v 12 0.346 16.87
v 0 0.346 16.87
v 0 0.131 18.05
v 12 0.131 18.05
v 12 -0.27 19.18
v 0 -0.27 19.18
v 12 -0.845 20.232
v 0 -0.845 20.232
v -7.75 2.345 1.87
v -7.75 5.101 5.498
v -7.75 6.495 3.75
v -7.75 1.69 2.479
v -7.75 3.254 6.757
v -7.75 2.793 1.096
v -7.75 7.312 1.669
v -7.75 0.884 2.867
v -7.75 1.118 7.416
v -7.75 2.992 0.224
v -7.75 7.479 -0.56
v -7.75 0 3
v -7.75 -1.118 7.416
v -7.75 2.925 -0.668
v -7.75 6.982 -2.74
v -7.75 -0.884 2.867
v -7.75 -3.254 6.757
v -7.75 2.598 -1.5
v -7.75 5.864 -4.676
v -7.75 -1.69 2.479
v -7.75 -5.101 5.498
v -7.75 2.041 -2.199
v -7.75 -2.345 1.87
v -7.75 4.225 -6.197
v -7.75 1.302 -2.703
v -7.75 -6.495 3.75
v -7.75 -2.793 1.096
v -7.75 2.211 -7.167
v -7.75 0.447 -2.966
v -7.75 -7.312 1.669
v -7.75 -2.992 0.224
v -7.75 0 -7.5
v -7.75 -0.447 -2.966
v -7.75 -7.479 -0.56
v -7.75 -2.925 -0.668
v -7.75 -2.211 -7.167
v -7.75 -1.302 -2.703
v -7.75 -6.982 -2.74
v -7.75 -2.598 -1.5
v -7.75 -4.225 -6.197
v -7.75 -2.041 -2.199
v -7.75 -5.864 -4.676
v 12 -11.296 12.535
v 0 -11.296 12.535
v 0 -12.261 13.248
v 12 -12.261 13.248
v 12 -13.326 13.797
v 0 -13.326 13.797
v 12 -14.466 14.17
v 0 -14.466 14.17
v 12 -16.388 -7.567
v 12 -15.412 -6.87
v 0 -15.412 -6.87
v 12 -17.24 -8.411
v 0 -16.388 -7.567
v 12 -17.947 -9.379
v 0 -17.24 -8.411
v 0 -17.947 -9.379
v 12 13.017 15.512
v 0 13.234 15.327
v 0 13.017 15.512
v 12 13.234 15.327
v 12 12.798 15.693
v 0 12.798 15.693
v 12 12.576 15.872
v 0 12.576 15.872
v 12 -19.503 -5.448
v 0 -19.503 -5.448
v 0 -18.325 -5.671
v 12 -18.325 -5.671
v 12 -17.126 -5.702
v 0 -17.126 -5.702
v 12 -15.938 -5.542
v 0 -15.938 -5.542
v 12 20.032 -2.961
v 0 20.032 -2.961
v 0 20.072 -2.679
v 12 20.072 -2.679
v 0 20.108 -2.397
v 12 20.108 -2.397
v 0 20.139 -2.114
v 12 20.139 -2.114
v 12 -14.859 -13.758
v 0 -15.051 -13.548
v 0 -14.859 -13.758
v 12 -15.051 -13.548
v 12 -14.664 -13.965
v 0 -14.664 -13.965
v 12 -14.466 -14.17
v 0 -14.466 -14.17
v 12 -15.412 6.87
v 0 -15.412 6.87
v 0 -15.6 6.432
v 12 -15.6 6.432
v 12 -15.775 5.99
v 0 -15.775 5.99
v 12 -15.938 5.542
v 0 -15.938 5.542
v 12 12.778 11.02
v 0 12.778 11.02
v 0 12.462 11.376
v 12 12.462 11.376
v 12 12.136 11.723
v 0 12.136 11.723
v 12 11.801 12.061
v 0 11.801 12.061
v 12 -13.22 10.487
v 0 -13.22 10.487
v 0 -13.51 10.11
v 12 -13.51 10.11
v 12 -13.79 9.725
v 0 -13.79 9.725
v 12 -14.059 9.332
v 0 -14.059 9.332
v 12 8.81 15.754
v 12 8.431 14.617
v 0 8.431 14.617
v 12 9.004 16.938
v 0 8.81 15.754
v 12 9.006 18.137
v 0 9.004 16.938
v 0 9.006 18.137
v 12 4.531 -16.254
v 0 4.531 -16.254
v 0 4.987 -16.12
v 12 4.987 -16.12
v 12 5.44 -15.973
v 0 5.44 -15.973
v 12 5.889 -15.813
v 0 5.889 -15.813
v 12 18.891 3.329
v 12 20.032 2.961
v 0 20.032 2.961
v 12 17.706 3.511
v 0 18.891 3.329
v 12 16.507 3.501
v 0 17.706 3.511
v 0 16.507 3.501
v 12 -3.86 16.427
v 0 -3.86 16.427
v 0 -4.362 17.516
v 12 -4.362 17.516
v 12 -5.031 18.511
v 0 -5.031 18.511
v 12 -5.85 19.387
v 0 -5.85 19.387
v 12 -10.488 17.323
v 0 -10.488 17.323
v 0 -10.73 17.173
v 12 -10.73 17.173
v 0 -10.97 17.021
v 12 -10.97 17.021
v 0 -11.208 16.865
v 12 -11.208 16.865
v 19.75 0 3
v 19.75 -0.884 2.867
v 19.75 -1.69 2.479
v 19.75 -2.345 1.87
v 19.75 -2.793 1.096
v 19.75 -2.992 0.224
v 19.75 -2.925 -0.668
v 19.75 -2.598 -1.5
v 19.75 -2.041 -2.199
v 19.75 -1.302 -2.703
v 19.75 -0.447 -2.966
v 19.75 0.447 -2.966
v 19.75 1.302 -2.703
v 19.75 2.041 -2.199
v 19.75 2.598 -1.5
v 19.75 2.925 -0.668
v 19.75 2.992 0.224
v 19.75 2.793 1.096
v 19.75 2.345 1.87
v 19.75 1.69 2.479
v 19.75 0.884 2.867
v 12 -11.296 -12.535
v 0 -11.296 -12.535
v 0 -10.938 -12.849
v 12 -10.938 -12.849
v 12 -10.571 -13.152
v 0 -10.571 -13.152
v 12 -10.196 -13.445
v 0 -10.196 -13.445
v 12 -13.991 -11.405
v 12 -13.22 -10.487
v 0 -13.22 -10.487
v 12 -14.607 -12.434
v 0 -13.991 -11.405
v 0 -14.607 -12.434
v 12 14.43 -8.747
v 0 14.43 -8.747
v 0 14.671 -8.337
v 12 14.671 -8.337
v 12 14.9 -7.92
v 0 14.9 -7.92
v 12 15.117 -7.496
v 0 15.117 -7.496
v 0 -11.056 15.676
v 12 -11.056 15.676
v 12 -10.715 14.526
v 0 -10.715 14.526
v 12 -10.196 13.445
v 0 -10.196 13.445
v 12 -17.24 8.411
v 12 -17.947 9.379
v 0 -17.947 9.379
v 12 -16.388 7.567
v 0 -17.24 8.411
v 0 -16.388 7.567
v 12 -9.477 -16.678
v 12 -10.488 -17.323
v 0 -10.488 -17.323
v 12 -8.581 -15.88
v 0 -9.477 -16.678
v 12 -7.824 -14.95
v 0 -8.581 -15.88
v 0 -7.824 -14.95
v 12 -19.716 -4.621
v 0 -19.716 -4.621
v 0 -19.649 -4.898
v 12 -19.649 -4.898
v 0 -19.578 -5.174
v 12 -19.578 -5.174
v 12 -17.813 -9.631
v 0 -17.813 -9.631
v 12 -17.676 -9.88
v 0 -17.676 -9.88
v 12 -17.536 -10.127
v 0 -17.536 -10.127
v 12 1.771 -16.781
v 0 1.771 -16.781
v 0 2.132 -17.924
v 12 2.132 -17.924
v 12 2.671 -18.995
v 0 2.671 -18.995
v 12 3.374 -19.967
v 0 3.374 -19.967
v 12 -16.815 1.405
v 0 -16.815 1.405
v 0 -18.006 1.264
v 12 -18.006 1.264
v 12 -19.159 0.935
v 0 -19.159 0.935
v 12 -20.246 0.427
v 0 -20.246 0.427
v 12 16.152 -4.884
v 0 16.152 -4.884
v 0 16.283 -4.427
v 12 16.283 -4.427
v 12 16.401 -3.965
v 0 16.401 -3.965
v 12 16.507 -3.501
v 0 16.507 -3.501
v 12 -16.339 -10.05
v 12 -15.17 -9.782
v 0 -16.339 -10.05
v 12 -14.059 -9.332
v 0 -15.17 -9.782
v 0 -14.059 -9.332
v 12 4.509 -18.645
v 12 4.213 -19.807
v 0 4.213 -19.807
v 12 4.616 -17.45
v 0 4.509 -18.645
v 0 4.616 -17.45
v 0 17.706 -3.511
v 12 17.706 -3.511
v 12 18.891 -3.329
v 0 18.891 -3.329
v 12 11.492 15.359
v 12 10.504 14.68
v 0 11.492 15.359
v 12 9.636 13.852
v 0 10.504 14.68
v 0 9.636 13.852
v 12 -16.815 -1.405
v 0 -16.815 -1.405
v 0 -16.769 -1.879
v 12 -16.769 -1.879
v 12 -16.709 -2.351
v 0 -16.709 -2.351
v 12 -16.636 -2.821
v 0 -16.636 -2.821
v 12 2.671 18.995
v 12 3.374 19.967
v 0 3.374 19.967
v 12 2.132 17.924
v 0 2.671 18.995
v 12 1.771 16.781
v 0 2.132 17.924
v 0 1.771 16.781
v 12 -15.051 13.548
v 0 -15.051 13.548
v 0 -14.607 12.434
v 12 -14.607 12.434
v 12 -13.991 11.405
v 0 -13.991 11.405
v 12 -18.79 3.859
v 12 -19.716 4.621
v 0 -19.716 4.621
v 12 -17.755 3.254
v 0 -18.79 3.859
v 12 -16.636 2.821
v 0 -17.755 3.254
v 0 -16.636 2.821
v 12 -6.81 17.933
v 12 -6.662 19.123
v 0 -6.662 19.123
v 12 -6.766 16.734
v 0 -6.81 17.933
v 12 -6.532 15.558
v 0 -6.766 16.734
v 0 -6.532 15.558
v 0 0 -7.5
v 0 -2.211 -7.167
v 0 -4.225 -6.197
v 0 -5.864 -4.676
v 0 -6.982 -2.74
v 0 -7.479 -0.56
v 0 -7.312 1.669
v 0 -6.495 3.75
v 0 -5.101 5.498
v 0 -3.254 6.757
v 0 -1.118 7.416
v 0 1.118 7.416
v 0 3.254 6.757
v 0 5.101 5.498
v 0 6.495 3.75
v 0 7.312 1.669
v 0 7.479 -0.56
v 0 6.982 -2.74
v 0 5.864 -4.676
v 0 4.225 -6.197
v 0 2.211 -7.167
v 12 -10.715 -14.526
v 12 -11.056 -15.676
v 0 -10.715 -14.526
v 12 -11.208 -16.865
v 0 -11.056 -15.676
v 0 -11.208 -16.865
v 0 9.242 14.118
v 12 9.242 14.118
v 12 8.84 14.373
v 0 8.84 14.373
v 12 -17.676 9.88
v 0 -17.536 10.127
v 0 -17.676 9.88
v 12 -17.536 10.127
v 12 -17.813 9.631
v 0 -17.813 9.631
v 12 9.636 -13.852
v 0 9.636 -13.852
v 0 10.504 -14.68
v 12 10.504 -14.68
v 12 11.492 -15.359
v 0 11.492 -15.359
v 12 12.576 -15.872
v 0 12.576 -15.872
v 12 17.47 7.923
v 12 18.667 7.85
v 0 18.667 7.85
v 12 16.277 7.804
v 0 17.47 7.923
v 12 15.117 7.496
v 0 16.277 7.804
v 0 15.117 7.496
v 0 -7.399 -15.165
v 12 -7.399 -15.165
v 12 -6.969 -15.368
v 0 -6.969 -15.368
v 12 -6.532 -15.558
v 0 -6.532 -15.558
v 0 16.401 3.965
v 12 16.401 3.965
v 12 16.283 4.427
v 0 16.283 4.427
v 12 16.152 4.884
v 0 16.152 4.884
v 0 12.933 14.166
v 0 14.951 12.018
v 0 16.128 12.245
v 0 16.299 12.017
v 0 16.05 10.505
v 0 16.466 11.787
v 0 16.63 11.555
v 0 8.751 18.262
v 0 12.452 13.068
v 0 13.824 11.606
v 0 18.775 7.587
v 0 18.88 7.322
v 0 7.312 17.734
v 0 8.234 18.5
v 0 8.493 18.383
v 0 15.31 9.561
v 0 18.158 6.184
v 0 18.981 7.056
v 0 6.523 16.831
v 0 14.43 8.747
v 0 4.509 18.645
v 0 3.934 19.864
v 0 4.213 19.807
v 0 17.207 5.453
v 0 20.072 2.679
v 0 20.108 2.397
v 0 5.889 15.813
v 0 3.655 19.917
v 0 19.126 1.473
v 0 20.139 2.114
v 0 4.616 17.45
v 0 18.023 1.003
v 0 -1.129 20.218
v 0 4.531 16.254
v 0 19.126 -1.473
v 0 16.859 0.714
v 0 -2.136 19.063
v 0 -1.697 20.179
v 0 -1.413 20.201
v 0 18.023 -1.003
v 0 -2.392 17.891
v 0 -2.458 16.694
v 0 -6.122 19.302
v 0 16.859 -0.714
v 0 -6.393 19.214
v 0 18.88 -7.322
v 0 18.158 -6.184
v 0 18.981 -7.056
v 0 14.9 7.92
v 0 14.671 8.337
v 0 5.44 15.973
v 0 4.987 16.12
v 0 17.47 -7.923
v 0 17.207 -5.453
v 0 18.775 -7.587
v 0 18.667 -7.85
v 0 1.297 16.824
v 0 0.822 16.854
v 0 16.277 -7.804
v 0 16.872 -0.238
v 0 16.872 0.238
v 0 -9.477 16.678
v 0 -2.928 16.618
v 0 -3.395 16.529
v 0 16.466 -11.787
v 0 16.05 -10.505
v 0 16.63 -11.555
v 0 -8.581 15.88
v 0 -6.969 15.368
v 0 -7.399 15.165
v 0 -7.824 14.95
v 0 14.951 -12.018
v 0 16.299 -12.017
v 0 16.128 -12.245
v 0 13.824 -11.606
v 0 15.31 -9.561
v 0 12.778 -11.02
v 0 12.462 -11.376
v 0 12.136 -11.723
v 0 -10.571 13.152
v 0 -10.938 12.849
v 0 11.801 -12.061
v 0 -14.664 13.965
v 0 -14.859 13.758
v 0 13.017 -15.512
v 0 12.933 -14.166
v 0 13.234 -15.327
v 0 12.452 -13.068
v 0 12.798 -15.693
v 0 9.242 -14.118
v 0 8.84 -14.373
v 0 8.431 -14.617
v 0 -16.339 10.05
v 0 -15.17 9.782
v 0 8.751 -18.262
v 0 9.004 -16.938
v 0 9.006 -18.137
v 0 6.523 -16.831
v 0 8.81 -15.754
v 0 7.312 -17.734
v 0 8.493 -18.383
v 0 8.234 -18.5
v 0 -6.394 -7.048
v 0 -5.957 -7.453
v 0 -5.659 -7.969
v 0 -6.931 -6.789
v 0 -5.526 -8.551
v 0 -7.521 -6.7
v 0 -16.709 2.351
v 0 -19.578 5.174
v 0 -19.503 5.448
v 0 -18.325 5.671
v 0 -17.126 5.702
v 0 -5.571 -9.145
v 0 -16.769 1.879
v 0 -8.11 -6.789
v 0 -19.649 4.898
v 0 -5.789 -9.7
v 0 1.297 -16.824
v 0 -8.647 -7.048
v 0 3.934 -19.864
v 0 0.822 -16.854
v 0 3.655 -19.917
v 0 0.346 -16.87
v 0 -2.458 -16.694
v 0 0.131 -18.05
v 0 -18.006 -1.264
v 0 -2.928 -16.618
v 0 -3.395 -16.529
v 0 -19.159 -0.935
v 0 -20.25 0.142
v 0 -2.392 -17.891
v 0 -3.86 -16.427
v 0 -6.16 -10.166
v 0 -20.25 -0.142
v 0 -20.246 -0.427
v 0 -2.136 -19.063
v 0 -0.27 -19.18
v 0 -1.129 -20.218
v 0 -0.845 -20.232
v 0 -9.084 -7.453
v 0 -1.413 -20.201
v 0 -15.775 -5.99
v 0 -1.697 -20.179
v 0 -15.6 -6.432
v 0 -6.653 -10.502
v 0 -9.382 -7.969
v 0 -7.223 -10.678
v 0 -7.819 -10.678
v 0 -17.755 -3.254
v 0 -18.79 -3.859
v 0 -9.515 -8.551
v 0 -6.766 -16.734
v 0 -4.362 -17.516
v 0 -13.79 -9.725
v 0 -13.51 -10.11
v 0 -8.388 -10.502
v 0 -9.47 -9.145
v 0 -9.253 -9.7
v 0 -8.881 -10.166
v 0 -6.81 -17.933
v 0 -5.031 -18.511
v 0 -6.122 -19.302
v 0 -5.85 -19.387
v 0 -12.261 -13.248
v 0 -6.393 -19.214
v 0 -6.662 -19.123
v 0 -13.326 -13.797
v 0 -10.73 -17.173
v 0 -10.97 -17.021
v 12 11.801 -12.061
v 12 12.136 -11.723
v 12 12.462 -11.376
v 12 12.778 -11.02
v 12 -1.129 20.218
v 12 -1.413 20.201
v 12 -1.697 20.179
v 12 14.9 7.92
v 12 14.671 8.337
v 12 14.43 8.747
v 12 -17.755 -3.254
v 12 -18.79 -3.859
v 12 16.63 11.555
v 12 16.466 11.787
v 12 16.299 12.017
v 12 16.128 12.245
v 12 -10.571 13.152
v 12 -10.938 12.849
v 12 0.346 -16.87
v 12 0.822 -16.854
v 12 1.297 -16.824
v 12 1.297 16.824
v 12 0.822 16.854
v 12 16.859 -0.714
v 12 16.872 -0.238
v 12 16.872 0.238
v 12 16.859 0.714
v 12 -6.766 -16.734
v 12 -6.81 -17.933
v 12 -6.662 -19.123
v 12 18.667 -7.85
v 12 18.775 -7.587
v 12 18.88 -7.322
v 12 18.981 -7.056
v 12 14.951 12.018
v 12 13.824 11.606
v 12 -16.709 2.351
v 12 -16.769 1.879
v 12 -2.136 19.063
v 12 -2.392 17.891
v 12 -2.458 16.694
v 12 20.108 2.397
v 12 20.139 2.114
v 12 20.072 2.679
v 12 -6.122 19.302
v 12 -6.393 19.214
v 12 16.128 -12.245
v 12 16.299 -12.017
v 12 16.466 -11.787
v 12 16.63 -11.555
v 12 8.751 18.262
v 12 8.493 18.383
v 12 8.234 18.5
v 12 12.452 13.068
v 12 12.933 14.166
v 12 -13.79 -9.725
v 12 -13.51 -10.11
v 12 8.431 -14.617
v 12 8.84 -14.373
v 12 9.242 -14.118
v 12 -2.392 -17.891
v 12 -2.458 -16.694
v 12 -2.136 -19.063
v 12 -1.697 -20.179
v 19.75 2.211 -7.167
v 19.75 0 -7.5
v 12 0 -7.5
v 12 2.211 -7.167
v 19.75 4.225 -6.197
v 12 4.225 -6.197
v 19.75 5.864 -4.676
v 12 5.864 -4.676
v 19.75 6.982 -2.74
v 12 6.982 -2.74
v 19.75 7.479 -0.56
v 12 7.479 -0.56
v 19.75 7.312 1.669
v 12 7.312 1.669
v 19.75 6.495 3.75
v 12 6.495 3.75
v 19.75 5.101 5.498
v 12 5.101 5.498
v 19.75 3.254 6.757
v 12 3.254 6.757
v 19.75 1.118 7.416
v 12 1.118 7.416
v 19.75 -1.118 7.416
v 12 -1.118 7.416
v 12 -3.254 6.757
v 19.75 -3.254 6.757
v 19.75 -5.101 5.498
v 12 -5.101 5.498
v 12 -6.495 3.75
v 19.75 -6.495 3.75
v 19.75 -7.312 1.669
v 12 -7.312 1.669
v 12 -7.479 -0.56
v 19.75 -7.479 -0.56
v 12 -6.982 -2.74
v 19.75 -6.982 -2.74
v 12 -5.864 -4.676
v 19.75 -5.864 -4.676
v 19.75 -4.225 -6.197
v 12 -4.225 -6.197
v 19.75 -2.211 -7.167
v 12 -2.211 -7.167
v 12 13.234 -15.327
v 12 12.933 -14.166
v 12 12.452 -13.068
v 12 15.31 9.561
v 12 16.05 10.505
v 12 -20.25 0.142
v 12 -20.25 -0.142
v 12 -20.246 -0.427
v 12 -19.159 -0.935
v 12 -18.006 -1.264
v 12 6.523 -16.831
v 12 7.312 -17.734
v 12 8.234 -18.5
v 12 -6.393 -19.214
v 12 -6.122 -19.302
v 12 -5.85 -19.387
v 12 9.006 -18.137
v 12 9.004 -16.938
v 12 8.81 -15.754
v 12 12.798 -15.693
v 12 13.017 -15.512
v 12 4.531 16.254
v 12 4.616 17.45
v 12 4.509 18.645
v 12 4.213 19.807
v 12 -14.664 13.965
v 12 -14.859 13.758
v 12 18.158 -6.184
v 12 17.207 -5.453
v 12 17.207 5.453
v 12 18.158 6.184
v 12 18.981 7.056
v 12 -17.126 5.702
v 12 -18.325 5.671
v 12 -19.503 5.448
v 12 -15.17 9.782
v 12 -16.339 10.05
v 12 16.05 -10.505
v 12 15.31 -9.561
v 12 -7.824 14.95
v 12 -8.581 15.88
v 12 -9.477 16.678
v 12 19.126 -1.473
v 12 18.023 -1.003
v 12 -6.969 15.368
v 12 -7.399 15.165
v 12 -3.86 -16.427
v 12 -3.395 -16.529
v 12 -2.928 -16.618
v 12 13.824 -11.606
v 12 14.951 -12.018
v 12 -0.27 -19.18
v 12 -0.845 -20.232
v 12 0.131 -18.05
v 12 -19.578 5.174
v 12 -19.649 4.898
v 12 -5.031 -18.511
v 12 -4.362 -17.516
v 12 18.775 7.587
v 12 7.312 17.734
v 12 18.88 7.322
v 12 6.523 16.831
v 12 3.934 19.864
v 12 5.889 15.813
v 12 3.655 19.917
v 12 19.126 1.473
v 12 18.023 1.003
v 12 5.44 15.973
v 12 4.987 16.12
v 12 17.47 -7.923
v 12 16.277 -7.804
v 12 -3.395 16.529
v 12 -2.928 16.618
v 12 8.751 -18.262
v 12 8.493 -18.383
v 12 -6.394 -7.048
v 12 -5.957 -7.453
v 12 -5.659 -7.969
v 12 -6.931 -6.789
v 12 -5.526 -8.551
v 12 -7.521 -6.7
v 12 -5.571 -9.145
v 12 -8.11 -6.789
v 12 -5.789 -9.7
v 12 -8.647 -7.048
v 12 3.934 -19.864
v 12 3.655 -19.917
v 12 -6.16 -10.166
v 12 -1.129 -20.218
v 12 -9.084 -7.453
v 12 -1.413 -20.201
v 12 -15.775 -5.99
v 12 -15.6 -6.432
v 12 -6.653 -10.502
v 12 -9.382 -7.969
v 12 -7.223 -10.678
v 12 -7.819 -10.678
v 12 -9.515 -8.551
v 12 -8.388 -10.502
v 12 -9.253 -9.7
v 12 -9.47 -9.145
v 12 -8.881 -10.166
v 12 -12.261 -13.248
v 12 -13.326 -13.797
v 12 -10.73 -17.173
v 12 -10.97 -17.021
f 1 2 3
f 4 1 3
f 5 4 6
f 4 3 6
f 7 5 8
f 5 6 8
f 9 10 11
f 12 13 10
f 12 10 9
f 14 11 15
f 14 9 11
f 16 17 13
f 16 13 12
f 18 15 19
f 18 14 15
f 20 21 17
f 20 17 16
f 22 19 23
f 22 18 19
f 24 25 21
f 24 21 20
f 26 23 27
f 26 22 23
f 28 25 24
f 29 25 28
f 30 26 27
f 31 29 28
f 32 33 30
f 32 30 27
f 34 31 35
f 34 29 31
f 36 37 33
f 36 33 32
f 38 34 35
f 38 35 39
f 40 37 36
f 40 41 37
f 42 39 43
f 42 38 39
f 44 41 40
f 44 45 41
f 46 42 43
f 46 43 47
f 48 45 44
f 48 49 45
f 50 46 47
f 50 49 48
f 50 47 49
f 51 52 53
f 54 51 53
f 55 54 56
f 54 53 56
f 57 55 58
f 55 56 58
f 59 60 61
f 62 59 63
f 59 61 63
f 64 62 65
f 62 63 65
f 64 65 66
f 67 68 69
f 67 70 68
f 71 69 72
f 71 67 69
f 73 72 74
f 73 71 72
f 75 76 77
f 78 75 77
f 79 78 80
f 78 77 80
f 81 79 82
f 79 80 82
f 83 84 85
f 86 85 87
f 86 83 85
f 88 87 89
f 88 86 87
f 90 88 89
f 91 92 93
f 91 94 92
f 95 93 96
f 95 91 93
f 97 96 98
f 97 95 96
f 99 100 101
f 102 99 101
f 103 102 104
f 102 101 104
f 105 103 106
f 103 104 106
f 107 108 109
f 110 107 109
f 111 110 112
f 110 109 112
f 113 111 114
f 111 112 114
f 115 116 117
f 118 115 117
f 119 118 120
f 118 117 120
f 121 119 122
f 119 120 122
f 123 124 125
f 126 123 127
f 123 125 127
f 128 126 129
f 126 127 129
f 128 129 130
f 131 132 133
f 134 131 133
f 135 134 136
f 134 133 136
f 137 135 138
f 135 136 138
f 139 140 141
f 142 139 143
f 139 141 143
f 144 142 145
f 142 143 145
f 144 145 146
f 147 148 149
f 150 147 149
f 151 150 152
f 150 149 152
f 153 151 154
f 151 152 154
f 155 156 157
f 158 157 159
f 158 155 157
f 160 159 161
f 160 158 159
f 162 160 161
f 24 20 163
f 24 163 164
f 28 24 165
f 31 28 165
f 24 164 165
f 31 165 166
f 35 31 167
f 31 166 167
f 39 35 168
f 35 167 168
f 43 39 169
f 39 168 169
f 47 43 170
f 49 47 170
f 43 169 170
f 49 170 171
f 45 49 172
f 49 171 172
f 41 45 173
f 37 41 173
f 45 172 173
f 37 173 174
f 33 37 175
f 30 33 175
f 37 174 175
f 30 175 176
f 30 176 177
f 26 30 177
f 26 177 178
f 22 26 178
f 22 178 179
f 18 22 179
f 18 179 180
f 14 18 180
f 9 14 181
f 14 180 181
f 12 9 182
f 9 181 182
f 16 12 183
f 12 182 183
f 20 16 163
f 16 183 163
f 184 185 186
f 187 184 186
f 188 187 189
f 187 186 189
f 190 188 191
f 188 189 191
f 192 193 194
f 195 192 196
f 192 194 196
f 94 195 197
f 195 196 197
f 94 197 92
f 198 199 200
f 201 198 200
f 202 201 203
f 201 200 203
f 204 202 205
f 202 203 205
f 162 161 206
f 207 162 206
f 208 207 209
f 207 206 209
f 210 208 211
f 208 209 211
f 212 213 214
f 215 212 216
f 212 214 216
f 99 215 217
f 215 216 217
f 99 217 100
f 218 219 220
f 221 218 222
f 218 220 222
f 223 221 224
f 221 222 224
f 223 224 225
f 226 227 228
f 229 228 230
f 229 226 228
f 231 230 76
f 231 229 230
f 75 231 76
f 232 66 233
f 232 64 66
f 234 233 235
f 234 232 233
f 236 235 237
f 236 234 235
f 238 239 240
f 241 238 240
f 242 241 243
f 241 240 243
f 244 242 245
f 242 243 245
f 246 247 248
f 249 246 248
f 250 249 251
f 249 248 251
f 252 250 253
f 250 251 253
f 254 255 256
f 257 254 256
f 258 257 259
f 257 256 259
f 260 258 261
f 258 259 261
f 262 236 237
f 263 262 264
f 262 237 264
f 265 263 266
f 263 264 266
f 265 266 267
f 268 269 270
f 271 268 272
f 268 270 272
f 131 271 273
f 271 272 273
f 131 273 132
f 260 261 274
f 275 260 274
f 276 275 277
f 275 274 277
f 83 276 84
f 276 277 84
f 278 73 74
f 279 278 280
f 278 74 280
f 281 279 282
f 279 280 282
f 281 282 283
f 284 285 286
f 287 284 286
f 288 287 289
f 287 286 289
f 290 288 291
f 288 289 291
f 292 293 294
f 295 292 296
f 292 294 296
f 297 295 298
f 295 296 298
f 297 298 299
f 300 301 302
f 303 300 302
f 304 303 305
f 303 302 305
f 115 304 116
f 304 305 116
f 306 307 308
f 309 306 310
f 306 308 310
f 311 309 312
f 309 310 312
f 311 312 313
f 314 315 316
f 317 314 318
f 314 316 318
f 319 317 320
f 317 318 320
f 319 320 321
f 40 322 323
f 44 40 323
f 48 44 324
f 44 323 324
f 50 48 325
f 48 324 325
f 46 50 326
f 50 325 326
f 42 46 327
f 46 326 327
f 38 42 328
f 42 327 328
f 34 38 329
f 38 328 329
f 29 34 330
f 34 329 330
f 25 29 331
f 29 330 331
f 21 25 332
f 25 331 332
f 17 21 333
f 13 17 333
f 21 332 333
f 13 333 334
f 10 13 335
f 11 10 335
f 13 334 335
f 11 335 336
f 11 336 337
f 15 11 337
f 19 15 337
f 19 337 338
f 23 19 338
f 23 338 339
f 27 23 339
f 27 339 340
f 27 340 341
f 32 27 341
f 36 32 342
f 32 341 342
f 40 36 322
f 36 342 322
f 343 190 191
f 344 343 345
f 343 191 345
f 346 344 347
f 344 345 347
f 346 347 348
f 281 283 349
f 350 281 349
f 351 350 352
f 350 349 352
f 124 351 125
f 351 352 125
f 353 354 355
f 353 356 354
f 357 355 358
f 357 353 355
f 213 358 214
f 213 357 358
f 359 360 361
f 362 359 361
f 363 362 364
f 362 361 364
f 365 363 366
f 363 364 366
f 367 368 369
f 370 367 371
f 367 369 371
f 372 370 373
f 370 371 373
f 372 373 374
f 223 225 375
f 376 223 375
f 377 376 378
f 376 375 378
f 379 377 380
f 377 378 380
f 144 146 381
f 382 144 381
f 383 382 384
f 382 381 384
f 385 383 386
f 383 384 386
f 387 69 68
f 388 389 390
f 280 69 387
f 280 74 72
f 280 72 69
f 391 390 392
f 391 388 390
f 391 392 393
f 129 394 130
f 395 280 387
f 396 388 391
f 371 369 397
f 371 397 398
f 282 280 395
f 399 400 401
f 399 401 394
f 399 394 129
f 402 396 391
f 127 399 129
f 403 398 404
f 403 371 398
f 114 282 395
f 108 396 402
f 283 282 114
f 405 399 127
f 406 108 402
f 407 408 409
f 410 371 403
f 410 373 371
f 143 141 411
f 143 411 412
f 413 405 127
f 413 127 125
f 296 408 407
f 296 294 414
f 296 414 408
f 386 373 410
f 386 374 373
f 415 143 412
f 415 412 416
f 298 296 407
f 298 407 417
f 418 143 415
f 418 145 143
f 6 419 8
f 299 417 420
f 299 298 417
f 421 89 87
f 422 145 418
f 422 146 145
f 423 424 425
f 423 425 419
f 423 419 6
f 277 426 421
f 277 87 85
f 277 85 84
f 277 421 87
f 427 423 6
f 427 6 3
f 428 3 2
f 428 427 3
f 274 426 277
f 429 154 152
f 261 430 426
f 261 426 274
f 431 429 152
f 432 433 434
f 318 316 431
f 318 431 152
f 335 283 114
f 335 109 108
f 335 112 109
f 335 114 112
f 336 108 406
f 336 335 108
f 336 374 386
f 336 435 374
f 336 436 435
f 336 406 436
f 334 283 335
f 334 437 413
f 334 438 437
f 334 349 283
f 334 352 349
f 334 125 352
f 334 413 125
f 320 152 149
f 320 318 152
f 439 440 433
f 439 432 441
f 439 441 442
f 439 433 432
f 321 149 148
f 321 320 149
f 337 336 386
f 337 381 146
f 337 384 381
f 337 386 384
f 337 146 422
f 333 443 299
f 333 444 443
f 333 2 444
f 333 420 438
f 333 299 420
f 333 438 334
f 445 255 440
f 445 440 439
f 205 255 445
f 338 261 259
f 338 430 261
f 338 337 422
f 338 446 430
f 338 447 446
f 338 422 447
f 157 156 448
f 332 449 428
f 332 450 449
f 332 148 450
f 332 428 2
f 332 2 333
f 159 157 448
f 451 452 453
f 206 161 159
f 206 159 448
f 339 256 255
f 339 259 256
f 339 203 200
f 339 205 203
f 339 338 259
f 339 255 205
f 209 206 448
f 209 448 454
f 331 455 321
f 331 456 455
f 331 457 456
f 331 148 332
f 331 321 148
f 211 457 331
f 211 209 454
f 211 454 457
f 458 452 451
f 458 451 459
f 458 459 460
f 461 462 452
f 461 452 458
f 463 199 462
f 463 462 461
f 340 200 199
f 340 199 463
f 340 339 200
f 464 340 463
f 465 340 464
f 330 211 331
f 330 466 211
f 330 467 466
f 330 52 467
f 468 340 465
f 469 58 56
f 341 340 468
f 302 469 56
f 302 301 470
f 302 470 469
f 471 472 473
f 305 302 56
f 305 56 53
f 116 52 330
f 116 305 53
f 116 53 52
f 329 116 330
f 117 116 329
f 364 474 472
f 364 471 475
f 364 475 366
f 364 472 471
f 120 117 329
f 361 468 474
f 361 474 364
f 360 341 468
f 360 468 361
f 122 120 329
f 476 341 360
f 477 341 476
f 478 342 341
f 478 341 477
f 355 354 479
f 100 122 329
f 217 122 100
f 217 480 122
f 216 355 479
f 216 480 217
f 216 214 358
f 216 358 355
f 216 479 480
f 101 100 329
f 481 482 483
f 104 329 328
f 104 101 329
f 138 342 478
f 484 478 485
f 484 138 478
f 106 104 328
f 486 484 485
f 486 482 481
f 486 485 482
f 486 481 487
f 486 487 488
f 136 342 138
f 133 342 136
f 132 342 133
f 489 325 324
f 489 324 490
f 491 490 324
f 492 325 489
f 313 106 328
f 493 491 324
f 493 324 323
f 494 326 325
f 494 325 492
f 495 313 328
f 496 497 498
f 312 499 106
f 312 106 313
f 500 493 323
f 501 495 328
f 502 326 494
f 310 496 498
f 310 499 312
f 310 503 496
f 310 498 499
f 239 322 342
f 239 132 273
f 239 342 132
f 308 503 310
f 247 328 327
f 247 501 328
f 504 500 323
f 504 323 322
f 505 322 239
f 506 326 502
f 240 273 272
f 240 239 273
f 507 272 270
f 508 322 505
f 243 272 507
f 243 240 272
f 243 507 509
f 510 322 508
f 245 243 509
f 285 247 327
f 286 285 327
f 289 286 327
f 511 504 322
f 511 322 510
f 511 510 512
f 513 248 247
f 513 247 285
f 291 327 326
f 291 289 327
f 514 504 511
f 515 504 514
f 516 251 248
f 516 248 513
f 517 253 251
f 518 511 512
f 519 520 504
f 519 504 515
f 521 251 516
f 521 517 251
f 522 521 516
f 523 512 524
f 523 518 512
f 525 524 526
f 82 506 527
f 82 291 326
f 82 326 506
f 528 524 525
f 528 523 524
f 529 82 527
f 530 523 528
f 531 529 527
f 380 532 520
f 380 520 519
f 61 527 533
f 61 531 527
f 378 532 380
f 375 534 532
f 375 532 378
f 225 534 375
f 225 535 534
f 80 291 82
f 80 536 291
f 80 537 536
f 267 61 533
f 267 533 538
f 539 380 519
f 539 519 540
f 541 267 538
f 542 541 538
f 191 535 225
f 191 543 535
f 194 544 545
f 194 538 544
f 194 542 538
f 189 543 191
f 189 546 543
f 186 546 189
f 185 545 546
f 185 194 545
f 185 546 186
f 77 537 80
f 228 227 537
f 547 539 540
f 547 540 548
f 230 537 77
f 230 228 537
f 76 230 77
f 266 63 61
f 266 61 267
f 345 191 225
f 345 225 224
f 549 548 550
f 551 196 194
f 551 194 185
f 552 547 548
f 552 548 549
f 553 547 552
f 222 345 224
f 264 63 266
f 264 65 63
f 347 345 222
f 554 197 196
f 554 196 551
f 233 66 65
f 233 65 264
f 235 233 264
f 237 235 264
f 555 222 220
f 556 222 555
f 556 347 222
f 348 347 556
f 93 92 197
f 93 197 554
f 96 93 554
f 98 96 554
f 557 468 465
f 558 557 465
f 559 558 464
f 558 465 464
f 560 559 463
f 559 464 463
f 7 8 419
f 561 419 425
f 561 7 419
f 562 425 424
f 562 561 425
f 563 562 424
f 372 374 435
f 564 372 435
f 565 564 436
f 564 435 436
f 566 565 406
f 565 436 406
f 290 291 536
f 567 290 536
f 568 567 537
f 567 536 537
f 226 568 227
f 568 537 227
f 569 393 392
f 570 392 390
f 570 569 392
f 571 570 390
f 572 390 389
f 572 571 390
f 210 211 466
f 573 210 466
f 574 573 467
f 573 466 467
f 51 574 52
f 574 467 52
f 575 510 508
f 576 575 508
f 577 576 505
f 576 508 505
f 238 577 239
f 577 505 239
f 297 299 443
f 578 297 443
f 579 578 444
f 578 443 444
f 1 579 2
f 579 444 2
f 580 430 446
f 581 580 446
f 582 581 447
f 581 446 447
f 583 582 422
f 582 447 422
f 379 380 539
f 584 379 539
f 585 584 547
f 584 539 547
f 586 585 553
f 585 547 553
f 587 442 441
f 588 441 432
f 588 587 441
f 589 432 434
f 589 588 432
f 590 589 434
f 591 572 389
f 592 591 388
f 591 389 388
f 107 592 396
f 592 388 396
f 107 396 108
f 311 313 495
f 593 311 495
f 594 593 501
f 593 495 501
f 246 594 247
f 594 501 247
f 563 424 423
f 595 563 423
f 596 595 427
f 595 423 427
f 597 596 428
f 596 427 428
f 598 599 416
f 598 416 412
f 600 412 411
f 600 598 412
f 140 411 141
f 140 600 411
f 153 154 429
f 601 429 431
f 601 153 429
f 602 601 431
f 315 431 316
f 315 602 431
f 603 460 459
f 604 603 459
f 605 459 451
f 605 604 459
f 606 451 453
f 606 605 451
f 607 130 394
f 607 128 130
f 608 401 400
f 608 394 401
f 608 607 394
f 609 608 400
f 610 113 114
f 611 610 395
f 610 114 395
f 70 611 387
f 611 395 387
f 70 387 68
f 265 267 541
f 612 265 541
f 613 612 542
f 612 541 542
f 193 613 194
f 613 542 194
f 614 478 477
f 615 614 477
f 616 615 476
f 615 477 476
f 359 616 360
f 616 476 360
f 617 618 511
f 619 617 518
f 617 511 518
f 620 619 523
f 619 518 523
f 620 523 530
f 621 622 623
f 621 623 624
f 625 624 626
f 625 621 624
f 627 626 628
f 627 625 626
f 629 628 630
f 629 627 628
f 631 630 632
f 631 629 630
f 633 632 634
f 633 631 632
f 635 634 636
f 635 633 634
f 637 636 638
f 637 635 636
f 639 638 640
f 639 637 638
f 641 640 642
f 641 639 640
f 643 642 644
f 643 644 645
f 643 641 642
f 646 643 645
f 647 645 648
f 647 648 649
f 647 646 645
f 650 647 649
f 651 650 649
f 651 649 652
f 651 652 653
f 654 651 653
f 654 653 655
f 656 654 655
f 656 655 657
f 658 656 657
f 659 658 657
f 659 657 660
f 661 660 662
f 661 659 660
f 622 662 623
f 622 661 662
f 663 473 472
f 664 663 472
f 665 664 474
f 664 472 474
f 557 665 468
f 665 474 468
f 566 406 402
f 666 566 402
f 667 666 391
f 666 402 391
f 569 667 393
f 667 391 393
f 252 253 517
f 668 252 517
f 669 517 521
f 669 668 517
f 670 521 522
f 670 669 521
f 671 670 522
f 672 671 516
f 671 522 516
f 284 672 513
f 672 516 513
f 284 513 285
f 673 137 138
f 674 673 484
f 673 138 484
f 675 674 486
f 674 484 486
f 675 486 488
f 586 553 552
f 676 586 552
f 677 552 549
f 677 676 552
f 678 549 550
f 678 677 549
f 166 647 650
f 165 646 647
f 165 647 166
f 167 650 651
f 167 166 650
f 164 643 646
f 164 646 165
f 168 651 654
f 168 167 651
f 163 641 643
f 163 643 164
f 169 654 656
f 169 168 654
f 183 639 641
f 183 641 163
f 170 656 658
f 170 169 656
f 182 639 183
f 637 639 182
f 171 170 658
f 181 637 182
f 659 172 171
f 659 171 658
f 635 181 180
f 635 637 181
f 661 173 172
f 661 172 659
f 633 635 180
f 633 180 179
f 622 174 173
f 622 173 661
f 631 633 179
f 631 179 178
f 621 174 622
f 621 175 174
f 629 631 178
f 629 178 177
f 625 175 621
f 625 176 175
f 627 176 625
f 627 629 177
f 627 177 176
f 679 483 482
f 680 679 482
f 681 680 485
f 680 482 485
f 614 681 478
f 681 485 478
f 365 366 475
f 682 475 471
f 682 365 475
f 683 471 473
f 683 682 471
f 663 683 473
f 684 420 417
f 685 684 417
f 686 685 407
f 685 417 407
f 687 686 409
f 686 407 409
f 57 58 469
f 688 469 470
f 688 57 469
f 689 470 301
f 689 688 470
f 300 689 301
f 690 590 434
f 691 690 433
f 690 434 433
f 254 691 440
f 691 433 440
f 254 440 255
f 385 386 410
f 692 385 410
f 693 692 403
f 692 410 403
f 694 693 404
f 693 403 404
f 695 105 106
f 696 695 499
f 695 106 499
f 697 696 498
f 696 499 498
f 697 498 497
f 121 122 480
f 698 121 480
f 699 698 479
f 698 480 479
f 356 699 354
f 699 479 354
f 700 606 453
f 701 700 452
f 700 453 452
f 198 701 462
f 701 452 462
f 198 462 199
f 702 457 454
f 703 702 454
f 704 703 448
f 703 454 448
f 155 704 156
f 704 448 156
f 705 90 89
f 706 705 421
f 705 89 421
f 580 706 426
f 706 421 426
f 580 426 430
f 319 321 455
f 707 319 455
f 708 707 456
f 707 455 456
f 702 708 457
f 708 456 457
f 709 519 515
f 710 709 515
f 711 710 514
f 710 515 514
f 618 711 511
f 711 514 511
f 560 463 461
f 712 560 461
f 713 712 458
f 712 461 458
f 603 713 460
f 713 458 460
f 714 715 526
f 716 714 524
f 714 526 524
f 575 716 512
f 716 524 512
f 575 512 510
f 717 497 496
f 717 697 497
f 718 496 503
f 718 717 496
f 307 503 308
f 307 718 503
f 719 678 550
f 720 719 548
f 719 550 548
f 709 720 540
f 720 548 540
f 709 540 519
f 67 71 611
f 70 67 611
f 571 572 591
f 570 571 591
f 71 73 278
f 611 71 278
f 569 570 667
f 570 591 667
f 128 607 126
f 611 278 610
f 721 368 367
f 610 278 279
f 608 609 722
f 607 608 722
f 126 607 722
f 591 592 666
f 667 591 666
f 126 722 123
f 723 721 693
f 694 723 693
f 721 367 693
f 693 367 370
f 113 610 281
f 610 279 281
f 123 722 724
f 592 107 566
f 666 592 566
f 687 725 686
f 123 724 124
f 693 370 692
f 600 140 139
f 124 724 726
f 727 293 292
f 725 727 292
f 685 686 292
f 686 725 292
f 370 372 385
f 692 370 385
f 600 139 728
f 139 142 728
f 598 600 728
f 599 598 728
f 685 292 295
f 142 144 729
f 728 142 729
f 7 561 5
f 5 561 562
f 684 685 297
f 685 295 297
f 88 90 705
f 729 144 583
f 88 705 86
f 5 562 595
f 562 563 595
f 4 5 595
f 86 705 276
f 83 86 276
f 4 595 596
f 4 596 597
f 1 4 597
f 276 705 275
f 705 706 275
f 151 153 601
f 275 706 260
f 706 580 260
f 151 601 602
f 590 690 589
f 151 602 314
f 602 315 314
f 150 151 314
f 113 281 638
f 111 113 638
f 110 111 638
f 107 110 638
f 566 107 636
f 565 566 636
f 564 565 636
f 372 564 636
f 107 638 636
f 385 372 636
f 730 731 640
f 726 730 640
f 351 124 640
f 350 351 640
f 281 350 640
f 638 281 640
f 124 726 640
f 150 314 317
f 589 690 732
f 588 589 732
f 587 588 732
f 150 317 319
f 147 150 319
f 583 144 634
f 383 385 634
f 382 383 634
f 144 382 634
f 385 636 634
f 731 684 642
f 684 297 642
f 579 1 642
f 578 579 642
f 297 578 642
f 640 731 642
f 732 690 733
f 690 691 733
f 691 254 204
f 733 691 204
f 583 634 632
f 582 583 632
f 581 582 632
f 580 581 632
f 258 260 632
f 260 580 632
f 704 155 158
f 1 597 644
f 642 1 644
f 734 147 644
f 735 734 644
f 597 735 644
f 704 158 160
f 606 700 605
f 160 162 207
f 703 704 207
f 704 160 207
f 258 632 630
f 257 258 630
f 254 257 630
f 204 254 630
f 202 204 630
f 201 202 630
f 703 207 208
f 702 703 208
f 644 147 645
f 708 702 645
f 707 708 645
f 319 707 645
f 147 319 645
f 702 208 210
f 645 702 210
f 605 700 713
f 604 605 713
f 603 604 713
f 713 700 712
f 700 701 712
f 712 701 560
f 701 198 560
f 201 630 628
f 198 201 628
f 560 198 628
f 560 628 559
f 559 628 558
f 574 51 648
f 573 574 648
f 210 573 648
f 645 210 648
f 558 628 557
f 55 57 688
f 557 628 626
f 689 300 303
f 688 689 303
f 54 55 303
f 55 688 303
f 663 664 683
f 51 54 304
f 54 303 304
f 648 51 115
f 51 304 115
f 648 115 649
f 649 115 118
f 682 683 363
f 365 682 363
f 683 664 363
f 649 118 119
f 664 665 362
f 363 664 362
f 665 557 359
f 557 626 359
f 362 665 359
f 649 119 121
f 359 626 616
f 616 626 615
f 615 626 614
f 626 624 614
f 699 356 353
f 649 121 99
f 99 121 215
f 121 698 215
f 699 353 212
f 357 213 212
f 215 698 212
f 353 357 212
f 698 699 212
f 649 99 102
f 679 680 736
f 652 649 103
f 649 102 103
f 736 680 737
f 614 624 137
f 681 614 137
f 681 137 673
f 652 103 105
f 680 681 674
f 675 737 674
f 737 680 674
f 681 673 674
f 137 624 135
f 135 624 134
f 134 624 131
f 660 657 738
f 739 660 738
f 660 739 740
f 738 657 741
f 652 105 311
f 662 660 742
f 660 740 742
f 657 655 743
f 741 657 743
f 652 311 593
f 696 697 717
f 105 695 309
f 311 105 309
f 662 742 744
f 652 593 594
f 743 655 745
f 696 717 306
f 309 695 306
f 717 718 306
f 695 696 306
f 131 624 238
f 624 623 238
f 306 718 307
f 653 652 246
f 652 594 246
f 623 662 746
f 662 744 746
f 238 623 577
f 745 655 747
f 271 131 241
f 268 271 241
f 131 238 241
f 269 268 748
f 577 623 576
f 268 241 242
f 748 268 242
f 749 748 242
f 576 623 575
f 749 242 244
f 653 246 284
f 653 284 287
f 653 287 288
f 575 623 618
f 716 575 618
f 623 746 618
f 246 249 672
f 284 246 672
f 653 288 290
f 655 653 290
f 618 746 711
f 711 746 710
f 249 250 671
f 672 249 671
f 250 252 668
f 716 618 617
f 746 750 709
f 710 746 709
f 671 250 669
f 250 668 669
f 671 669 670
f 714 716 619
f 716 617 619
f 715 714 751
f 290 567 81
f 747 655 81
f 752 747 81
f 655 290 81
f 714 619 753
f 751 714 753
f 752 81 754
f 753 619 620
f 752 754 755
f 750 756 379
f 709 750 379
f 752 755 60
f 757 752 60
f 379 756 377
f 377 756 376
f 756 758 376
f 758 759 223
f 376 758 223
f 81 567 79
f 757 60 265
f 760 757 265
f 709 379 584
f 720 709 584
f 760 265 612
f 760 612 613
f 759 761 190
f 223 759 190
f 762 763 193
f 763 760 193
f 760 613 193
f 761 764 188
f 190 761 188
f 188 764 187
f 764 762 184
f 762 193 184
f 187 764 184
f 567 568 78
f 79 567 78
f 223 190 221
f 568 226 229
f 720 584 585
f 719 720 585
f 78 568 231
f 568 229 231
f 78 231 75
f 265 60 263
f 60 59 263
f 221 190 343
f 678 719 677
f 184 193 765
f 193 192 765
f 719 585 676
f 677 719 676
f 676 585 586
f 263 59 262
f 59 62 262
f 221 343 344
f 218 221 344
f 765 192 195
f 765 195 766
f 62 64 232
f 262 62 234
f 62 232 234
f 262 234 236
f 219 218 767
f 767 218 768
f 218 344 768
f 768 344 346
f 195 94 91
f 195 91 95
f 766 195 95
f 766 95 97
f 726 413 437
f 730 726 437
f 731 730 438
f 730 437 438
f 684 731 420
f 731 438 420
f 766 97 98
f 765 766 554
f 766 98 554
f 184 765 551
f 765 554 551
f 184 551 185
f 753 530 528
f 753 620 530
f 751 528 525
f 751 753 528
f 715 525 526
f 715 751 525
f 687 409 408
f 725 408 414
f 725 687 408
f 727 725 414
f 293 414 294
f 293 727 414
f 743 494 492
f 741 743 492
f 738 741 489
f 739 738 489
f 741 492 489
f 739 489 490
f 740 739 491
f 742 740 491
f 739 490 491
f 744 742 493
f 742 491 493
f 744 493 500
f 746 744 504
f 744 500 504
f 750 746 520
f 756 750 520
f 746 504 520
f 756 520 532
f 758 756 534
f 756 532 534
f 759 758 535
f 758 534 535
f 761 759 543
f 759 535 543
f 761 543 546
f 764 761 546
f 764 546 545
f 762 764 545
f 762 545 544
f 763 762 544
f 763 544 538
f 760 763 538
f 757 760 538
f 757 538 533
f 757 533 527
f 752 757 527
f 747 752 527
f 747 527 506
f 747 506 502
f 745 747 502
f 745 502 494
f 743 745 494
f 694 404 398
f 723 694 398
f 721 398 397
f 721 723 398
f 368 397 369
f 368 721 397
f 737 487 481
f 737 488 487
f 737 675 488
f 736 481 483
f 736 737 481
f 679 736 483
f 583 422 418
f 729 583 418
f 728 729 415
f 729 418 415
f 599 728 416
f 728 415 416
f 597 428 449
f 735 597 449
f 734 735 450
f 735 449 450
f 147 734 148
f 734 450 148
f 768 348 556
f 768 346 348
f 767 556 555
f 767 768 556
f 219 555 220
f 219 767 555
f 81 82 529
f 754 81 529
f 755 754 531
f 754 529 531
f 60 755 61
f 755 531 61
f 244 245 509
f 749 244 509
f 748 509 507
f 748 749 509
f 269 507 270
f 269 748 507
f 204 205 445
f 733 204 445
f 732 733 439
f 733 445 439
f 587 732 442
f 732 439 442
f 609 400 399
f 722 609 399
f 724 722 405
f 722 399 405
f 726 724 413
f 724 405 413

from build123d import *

# Parameters (mm, degrees)
BASPROSKE_W        = 12
BASPROSKE_H        = 20.25
TOOTHCUT_DEPTH     = 32.050362317
TEETHCUTS_COUNT    = 25
TEETHCUTS_ANGLE    = 345.6
HUBNEABOTSKE_R     = 7.5
HUBNEARBOTH_DEPTH  = 7.7500254
HUBFAR_START       = 7.7500254
HUBFARSKE_R        = 7.5
HUBFAR_DEPTH       = 7.7500254
BORSKE_R           = 3
BORE_DEPTH         = 27.5000508
SKETCH1_R          = 2
CUT_EXTRUDE1_DEPTH = 15


with BuildPart() as part:
    # BasProSke → Base-Revolve (revolve)
    with BuildSketch(Plane(origin=(0, 0, 0), x_dir=(1, 0, 0), z_dir=(0, 1, 0)), mode=Mode.PRIVATE) as base_revolve_sk:
        with Locations((6, 10.125)):
            Rectangle(BASPROSKE_W, BASPROSKE_H)
    revolve(base_revolve_sk.sketch.rotate(Axis((-10, 0, 0), (1, 0, 0)), 180), axis=Axis((-10, 0, 0), (1, 0, 0)))

    # TooCutSke → ToothCut (cut, through all)
    with BuildSketch(Plane(origin=(0, 0, 0), x_dir=(0, 0, -1), z_dir=(1, 0, 0))):
        with BuildLine():
            ThreePointArc((0.713909619, 16.858891098), (0, 16.874), (-0.713909619, 16.858891098))
            ThreePointArc((-0.713909619, 16.858891098), (-1.221902209, 18.597177626), (-2.131751691, 20.163022588))
            ThreePointArc((-2.131751691, 20.163022588), (0, 20.2754), (2.131751691, 20.163022588))
            ThreePointArc((2.131751691, 20.163022588), (1.221902209, 18.597177626), (0.713909619, 16.858891098))
        make_face()
    toothcut = extrude(amount=TOOTHCUT_DEPTH, mode=Mode.SUBTRACT)

    # TeethCuts: ToothCut ×25 about axis
    teethcuts_axis = Axis((-10, 0, 0), (1, 0, 0))
    for i in range(1, TEETHCUTS_COUNT):
        add(toothcut.rotate(teethcuts_axis, i * TEETHCUTS_ANGLE / (TEETHCUTS_COUNT - 1)), mode=Mode.SUBTRACT)

    # HubNeaBotSke → HubNearBoth (add)
    with BuildSketch(Plane.ZY):
        with Locations(Location((0, 0, 0), (0, 0, 180))):
            Circle(HUBNEABOTSKE_R)
    extrude(amount=HUBNEARBOTH_DEPTH)

    # HubFarSke → HubFar (add)
    with BuildSketch(Plane(origin=(12, 0, 0), x_dir=(0, 0, -1), z_dir=(1, 0, 0)).offset(HUBFAR_START)):
        Circle(HUBFARSKE_R)
    extrude(amount=-HUBFAR_DEPTH)

    # BorSke → Bore (cut, symmetric)
    with BuildSketch(Plane(origin=(0, 0, 0), x_dir=(0, 0, -1), z_dir=(1, 0, 0))):
        with Locations(Location((0, 0, 0), (0, 0, 180))):
            Circle(BORSKE_R)
    extrude(amount=BORE_DEPTH, both=True, mode=Mode.SUBTRACT)

    # Sketch1 → Cut-Extrude1 (cut)
    with BuildSketch(Plane.ZY):
        with Locations((-8.700018149, -7.520617276)):
            Circle(SKETCH1_R)
    extrude(amount=-CUT_EXTRUDE1_DEPTH, mode=Mode.SUBTRACT)


solid = part.part
